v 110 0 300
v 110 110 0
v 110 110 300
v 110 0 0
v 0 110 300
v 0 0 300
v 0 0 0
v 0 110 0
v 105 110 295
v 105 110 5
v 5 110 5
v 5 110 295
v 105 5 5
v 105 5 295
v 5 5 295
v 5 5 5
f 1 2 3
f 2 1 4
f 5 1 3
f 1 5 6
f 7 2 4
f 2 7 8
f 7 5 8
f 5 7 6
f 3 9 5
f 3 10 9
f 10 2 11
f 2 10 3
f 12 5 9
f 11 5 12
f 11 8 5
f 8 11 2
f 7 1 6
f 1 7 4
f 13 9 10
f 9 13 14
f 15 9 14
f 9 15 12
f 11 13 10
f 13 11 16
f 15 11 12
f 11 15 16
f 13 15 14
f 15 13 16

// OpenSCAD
// file: elevator/cabin.scad
module cabin(height, width, depth, thickness) {
  double_thickness = thickness * 2;
  
  difference() {
    cube([width, depth, height]);

    translate([thickness, thickness, thickness])
    cube([width - double_thickness, 
          depth,
          height - double_thickness]);
  }
}
// file: elevator/shaft.scad
module shaft(height, cabin_width, cabin_depth, thickness) {
  double_thickness = thickness * 2;
  quad_thickness = double_thickness * 2;

  difference() {
    cube([cabin_width + quad_thickness, cabin_depth + quad_thickness, height]);

    translate([thickness, thickness, thickness])
    cube([cabin_width + double_thickness, cabin_depth + quad_thickness, height]);
  }
}

  cabin_height = 300;
  cabin_width = 110;
  cabin_depth = 110;

  shaft_height = 3000;
  
  thickness = 5;

  union() {
    shaft(shaft_height, cabin_width, cabin_depth, thickness);
  }
// file: elevator/elevator.scad
use <shaft.scad>
use <cabin.scad>

module elevator() {
  height = 300;
  width = 110;
  depth = 110;
  thickness = 5;

  cabin(height, width, depth, thickness);
}
// main file
use <elevator/elevator.scad>

translate([0, 0, $t * 500])
elevator();
